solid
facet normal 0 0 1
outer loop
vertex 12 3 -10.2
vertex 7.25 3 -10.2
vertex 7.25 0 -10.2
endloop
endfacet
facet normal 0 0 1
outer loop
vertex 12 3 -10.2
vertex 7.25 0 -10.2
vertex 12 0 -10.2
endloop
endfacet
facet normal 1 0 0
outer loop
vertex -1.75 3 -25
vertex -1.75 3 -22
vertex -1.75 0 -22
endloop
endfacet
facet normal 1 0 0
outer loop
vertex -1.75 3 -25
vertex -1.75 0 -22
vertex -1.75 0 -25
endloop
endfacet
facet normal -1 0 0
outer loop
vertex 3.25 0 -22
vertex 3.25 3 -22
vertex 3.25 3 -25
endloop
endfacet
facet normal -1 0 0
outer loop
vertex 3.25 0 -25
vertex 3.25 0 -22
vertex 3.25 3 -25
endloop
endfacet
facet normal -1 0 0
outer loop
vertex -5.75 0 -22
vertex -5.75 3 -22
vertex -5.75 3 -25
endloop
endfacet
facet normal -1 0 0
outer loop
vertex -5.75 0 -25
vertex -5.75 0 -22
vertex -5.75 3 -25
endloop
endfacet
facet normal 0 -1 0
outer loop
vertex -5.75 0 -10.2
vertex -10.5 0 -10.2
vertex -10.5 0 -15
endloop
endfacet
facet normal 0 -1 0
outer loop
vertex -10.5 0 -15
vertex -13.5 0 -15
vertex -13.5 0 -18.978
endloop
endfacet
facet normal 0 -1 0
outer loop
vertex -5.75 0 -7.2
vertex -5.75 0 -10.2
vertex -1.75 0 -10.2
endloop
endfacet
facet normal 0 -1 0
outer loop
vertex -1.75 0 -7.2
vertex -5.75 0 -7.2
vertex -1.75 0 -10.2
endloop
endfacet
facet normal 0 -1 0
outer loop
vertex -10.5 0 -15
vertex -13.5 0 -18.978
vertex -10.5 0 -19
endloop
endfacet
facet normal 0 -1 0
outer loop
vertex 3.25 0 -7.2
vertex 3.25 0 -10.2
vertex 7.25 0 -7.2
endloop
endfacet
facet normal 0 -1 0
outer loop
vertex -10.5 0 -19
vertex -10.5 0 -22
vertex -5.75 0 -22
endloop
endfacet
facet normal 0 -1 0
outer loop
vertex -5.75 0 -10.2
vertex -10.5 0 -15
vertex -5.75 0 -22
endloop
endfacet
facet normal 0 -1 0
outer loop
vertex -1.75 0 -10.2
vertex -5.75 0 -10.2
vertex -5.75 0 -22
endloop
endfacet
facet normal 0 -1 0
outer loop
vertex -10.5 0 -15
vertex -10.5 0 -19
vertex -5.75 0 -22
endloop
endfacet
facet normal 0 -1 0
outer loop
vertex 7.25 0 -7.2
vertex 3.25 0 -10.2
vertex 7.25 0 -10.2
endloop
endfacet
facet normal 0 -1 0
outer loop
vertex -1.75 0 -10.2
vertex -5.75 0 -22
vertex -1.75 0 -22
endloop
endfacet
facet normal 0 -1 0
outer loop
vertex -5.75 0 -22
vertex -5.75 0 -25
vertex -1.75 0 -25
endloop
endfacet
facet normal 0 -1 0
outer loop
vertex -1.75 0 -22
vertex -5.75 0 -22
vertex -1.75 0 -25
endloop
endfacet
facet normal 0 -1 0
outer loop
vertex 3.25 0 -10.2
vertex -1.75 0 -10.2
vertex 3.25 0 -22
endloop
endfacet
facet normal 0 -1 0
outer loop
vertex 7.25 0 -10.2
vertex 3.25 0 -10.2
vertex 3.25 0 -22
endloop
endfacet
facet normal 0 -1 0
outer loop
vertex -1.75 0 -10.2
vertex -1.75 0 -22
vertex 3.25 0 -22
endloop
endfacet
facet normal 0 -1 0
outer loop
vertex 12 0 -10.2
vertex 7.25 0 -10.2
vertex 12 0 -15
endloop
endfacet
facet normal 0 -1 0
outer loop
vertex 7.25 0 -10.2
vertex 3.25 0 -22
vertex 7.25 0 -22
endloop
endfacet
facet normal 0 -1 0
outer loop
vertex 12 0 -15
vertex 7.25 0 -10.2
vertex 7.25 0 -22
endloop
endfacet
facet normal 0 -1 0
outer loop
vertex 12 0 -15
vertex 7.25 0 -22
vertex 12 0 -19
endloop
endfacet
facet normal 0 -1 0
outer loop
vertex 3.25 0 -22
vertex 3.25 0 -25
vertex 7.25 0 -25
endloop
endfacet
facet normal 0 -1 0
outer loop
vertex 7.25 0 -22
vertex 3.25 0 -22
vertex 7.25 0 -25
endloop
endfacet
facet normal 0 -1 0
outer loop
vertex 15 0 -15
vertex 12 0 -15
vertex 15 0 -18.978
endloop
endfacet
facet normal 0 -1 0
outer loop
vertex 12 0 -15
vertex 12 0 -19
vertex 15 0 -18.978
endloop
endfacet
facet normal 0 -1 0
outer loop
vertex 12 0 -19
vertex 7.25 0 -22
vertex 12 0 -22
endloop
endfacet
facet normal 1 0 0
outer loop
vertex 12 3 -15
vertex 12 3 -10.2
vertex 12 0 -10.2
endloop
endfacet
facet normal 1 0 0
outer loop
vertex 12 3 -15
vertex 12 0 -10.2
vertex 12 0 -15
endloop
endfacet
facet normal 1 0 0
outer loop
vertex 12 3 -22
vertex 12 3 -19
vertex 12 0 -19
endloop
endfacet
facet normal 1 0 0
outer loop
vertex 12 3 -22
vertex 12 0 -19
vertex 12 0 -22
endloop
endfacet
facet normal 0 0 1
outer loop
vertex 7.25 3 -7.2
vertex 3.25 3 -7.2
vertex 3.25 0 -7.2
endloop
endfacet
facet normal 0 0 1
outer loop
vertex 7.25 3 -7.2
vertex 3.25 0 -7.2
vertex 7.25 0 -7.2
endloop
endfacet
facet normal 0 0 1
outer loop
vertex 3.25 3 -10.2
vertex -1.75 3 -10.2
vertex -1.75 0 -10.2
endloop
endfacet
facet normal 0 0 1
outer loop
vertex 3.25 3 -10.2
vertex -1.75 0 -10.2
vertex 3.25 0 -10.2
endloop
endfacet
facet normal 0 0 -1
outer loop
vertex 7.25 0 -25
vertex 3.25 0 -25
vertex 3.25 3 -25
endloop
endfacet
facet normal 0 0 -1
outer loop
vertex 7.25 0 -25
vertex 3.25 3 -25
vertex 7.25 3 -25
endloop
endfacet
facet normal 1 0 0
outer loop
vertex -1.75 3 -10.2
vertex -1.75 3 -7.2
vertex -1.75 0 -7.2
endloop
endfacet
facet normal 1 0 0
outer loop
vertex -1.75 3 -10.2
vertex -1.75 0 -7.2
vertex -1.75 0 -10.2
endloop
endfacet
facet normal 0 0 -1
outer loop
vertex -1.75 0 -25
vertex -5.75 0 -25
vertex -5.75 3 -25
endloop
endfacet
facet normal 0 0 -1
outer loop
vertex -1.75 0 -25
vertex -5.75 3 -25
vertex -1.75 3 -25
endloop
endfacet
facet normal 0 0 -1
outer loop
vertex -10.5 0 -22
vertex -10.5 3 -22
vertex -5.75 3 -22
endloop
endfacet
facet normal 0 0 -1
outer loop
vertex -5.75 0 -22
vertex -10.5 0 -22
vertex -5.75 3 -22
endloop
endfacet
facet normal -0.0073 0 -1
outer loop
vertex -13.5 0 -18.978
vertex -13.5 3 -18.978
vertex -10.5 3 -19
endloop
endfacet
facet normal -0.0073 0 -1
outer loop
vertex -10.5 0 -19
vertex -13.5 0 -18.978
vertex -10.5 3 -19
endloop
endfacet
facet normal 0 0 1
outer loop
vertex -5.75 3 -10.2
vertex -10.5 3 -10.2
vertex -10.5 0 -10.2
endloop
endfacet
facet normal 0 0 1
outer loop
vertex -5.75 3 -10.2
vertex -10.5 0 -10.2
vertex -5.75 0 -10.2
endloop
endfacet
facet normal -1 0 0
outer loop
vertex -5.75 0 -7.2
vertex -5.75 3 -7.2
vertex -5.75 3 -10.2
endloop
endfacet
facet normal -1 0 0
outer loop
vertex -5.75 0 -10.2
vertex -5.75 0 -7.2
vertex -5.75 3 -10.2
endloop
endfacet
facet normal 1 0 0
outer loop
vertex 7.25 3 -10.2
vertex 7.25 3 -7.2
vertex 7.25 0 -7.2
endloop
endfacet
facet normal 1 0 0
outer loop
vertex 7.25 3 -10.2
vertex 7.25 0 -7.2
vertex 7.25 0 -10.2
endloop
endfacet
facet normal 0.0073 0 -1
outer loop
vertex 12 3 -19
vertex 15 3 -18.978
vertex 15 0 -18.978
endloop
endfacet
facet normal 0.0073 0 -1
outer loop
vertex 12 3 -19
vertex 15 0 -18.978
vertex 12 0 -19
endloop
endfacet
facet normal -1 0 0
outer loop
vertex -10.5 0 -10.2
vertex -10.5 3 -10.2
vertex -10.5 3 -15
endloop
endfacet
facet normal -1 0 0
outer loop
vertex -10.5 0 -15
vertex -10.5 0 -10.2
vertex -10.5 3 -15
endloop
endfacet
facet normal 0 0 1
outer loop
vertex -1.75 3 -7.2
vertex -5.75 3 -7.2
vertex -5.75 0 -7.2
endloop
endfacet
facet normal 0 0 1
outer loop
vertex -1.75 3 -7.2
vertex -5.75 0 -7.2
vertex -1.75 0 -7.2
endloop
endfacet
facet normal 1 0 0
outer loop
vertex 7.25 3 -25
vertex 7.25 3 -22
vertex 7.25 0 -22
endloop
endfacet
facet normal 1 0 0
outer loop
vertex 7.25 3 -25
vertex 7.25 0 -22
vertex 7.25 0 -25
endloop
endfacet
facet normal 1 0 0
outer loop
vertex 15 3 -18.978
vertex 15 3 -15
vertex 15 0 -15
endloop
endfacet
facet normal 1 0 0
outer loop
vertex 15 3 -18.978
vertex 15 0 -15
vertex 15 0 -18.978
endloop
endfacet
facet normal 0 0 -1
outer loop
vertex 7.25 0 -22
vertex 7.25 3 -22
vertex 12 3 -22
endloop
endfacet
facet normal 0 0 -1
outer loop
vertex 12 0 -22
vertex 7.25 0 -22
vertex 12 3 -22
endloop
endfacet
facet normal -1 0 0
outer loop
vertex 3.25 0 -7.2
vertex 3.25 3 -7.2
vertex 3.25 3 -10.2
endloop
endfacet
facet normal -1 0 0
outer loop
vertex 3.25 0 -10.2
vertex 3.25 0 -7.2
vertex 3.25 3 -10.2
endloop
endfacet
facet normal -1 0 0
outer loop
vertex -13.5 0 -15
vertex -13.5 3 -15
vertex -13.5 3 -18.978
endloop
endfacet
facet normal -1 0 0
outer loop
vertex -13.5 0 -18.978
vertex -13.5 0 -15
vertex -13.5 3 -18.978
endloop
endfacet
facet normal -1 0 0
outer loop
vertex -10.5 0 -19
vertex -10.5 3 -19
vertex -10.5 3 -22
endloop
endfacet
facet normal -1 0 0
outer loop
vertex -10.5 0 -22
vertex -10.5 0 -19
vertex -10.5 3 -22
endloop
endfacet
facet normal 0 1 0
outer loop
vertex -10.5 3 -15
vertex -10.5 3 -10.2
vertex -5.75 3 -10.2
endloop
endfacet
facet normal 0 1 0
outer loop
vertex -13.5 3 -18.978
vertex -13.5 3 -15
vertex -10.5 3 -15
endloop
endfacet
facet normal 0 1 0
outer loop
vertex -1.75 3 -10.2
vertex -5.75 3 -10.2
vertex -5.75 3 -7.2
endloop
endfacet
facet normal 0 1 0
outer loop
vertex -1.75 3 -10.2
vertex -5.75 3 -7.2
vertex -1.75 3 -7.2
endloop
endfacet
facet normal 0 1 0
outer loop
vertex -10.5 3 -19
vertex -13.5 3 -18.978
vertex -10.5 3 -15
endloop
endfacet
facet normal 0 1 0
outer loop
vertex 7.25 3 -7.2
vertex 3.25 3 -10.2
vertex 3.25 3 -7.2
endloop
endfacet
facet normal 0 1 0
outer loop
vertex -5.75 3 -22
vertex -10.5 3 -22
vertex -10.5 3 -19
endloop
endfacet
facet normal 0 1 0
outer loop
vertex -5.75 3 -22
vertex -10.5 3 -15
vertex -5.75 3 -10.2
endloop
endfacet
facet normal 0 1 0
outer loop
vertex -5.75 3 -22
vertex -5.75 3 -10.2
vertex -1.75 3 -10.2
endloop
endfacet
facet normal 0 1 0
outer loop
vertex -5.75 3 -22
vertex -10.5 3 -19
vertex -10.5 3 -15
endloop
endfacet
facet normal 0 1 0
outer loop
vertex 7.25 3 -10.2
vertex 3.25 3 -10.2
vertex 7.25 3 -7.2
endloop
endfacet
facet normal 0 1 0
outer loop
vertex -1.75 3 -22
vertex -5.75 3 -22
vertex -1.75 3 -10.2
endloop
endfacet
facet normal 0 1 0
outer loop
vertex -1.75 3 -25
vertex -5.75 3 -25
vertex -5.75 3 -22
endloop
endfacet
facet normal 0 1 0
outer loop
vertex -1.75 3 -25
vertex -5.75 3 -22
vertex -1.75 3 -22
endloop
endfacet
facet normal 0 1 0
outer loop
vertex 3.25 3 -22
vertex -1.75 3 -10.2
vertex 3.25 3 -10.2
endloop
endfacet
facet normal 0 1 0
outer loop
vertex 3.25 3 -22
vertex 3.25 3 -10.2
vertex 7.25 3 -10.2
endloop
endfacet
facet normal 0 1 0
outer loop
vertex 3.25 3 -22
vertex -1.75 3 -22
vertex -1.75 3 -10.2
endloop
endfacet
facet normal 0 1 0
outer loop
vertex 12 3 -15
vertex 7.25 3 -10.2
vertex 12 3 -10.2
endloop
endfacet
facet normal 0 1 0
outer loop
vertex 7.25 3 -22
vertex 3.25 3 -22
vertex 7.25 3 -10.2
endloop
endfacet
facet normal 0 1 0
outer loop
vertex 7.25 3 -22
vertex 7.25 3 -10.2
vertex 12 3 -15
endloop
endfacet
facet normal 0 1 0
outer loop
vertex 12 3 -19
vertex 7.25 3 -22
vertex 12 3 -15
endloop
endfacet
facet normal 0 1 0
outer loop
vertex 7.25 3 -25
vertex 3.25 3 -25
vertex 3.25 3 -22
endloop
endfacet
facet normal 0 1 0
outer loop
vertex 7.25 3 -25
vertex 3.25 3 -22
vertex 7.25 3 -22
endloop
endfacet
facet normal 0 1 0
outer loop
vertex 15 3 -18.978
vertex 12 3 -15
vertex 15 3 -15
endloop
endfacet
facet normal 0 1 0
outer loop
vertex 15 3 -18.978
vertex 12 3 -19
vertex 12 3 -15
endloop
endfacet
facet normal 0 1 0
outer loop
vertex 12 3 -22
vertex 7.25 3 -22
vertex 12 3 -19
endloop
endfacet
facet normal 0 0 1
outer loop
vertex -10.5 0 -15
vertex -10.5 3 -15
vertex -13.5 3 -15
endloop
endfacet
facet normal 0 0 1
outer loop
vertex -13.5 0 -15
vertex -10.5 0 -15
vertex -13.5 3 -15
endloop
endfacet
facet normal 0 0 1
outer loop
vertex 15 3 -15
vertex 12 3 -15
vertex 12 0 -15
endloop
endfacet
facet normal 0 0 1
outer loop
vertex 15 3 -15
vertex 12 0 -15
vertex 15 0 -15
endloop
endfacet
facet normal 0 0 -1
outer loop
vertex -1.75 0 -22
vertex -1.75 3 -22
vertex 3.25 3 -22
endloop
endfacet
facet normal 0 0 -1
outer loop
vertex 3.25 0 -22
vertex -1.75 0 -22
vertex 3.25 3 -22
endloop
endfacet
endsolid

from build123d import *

# Parameters (mm, degrees)
SKETCH1_W           = 30
SKETCH1_H           = 50
BOSS_EXTRUDE1_DEPTH = 3
SKETCH2_W           = 7.75
SKETCH2_H           = 3
SKETCH2_W_2         = 5
CUT_EXTRUDE1_DEPTH  = 10
CUT_EXTRUDE2_DEPTH  = 10
SKETCH4_W           = 7.75
SKETCH4_H           = 3
SKETCH4_W_2         = 5
CUT_EXTRUDE3_DEPTH  = 10
CUT_EXTRUDE4_DEPTH  = 3


with BuildPart() as part:
    # Sketch1 → Boss-Extrude1 (new body)
    with BuildSketch(Plane(origin=(0, 0, 0), x_dir=(1, 0, 0), z_dir=(0, 1, 0))):
        Rectangle(SKETCH1_W, SKETCH1_H)
    extrude(amount=BOSS_EXTRUDE1_DEPTH)

    # Sketch2 → Cut-Extrude1 (cut)
    with BuildSketch(Plane(origin=(0, 3, 0), x_dir=(1, 0, 0), z_dir=(0, 1, 0))):
        with Locations((11.125, 23.5)):
            Rectangle(SKETCH2_W, SKETCH2_H)
        with Locations((0.75, 23.5)):
            Rectangle(SKETCH2_W_2, SKETCH2_H)
        with Locations((-9.625, 23.5)):
            Rectangle(SKETCH2_W, SKETCH2_H)
    extrude(amount=-CUT_EXTRUDE1_DEPTH, mode=Mode.SUBTRACT)

    # Sketch3 → Cut-Extrude2 (cut)
    with BuildSketch(Plane(origin=(0, 3, 0), x_dir=(1, 0, 0), z_dir=(0, 1, 0))):
        Polygon((-13.5, 22), (-13.5, 7.2), (33.838871071, 7.2), (23.912216497, -42.141377109), (-28.226414581, -62.151393572), (-28.226414581, 29.547983922), (-12.54526701, 26.393200971), align=None)
    extrude(amount=-CUT_EXTRUDE2_DEPTH, mode=Mode.SUBTRACT)

    # Sketch4 → Cut-Extrude3 (cut)
    with BuildSketch(Plane(origin=(0, 3, 0), x_dir=(1, 0, 0), z_dir=(0, 1, 0))):
        with Locations((11.125, 8.7)):
            Rectangle(SKETCH4_W, SKETCH4_H)
        with Locations((-9.625, 8.7)):
            Rectangle(SKETCH4_W, SKETCH4_H)
        with Locations((0.75, 8.7)):
            Rectangle(SKETCH4_W_2, SKETCH4_H)
    extrude(amount=-CUT_EXTRUDE3_DEPTH, mode=Mode.SUBTRACT)

    # Sketch5 → Cut-Extrude4 (cut)
    with BuildSketch(Plane(origin=(0, 3, 0), x_dir=(1, 0, 0), z_dir=(0, 1, 0))):
        Polygon((-10.5, 10.2), (-10.5, 15), (-13.5, 15), (-13.5, 18.977632451), (-10.5, 19), (-10.5, 22), (-14.44173644, 22), (-14.44173644, 10.2), align=None)
        Polygon((15.94173644, 22), (15.94173644, 10.2), (12, 10.2), (12, 15), (15, 15), (15, 18.977632451), (12, 19), (12, 22), align=None)
    extrude(amount=-CUT_EXTRUDE4_DEPTH, mode=Mode.SUBTRACT)


solid = part.part
